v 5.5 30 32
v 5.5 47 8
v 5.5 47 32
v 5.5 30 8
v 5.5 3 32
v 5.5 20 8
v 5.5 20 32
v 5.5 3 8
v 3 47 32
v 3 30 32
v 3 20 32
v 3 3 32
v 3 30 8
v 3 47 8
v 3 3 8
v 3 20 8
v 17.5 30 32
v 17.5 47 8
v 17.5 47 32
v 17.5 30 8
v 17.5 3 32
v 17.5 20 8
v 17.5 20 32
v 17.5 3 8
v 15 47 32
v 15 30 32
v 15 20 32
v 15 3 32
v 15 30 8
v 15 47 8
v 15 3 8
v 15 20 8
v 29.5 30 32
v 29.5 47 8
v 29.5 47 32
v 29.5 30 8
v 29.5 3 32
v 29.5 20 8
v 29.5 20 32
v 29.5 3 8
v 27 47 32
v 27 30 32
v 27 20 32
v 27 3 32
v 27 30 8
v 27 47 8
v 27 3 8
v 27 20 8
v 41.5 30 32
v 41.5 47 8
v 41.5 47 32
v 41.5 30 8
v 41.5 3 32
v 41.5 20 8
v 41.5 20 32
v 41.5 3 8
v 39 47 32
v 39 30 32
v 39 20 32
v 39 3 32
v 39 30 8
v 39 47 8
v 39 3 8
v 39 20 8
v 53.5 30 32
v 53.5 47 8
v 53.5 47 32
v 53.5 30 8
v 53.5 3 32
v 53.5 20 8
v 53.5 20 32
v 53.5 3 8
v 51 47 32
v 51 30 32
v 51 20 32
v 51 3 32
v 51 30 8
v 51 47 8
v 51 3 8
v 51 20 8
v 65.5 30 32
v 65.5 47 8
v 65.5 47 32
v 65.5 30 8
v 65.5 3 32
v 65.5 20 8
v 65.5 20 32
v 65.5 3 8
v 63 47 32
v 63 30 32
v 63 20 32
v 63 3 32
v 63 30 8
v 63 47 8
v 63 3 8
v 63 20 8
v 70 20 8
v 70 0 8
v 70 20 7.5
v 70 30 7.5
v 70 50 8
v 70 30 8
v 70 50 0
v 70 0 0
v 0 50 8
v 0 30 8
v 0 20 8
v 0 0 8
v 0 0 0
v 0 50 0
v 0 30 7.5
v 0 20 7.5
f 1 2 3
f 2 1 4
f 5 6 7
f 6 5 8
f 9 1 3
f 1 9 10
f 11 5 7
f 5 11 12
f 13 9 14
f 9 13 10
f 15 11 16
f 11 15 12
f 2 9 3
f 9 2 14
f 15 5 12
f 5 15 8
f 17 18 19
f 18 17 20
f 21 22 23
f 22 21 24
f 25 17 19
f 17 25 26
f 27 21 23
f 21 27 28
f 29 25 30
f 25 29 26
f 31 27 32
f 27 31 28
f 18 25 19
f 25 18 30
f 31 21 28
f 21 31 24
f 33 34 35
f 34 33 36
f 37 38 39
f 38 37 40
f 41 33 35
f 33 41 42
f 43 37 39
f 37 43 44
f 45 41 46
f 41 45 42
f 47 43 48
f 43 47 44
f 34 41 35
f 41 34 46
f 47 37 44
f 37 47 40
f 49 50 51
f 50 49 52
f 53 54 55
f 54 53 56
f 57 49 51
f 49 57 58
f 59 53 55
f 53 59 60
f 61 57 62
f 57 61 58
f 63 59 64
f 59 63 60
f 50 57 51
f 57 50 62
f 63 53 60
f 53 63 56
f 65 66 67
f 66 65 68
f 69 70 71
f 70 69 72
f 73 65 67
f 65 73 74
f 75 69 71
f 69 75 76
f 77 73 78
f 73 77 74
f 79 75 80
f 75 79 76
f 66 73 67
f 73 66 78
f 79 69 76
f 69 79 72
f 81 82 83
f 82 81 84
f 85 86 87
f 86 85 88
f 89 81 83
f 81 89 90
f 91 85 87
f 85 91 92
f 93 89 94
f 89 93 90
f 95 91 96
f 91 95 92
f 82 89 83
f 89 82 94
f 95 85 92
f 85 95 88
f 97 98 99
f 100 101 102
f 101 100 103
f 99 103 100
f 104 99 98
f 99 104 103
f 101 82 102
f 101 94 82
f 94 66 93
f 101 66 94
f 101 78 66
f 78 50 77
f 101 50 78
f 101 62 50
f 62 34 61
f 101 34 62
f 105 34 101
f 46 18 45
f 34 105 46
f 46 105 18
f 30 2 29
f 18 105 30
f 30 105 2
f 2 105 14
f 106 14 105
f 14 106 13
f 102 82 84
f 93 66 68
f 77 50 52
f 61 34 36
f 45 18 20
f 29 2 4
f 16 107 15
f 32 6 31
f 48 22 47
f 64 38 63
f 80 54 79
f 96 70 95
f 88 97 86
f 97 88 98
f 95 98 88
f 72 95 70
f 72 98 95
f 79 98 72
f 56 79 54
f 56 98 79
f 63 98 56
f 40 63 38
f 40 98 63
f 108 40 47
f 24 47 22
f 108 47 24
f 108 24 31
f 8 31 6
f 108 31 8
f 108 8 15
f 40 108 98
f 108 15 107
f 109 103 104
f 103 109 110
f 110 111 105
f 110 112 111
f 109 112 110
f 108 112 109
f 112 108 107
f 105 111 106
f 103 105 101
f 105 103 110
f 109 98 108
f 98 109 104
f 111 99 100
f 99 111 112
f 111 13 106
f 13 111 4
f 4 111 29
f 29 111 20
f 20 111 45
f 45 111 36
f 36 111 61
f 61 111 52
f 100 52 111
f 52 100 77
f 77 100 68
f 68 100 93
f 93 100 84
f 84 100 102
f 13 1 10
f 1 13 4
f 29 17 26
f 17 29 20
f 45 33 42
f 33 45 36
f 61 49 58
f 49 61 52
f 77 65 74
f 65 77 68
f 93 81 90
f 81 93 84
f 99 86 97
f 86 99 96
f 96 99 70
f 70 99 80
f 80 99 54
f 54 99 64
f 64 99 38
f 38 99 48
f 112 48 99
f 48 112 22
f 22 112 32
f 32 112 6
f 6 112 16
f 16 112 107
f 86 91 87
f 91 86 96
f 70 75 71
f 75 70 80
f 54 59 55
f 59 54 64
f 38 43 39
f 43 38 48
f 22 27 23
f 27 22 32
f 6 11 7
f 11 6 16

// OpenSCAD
$fn = 32;

// ----------------------------------------------------------------------
// Heatsink: slotted fin block
// ----------------------------------------------------------------------

// --- parameters (mm) ---
base_l = 70;              // base length, X
base_w = 50;              // base width, Y
base_t = 8;               // base plate thickness
fin_h = 25;               // fin height above the base
fin_t = 2.5;              // fin thickness
edge = 3;                 // margin from the base ends
pitch = 12;               // fin pitch
slot_w = 10;              // central slot width, Y

n_fins = floor((base_l - 2 * edge - fin_t) / pitch) + 1;  // fin count
total_h = base_t + fin_h - 1;  // overall height

difference() {
union() {
  cube([base_l, base_w, base_t]);
  for (i = [0 : n_fins - 1])
    translate([edge + i * pitch, edge, base_t - 1])
      cube([fin_t, base_w - 2 * edge, fin_h]);
}
  translate([-1, base_w / 2 - slot_w / 2, base_t - 0.5])
    cube([base_l + 2, slot_w, fin_h + 2]);
}
